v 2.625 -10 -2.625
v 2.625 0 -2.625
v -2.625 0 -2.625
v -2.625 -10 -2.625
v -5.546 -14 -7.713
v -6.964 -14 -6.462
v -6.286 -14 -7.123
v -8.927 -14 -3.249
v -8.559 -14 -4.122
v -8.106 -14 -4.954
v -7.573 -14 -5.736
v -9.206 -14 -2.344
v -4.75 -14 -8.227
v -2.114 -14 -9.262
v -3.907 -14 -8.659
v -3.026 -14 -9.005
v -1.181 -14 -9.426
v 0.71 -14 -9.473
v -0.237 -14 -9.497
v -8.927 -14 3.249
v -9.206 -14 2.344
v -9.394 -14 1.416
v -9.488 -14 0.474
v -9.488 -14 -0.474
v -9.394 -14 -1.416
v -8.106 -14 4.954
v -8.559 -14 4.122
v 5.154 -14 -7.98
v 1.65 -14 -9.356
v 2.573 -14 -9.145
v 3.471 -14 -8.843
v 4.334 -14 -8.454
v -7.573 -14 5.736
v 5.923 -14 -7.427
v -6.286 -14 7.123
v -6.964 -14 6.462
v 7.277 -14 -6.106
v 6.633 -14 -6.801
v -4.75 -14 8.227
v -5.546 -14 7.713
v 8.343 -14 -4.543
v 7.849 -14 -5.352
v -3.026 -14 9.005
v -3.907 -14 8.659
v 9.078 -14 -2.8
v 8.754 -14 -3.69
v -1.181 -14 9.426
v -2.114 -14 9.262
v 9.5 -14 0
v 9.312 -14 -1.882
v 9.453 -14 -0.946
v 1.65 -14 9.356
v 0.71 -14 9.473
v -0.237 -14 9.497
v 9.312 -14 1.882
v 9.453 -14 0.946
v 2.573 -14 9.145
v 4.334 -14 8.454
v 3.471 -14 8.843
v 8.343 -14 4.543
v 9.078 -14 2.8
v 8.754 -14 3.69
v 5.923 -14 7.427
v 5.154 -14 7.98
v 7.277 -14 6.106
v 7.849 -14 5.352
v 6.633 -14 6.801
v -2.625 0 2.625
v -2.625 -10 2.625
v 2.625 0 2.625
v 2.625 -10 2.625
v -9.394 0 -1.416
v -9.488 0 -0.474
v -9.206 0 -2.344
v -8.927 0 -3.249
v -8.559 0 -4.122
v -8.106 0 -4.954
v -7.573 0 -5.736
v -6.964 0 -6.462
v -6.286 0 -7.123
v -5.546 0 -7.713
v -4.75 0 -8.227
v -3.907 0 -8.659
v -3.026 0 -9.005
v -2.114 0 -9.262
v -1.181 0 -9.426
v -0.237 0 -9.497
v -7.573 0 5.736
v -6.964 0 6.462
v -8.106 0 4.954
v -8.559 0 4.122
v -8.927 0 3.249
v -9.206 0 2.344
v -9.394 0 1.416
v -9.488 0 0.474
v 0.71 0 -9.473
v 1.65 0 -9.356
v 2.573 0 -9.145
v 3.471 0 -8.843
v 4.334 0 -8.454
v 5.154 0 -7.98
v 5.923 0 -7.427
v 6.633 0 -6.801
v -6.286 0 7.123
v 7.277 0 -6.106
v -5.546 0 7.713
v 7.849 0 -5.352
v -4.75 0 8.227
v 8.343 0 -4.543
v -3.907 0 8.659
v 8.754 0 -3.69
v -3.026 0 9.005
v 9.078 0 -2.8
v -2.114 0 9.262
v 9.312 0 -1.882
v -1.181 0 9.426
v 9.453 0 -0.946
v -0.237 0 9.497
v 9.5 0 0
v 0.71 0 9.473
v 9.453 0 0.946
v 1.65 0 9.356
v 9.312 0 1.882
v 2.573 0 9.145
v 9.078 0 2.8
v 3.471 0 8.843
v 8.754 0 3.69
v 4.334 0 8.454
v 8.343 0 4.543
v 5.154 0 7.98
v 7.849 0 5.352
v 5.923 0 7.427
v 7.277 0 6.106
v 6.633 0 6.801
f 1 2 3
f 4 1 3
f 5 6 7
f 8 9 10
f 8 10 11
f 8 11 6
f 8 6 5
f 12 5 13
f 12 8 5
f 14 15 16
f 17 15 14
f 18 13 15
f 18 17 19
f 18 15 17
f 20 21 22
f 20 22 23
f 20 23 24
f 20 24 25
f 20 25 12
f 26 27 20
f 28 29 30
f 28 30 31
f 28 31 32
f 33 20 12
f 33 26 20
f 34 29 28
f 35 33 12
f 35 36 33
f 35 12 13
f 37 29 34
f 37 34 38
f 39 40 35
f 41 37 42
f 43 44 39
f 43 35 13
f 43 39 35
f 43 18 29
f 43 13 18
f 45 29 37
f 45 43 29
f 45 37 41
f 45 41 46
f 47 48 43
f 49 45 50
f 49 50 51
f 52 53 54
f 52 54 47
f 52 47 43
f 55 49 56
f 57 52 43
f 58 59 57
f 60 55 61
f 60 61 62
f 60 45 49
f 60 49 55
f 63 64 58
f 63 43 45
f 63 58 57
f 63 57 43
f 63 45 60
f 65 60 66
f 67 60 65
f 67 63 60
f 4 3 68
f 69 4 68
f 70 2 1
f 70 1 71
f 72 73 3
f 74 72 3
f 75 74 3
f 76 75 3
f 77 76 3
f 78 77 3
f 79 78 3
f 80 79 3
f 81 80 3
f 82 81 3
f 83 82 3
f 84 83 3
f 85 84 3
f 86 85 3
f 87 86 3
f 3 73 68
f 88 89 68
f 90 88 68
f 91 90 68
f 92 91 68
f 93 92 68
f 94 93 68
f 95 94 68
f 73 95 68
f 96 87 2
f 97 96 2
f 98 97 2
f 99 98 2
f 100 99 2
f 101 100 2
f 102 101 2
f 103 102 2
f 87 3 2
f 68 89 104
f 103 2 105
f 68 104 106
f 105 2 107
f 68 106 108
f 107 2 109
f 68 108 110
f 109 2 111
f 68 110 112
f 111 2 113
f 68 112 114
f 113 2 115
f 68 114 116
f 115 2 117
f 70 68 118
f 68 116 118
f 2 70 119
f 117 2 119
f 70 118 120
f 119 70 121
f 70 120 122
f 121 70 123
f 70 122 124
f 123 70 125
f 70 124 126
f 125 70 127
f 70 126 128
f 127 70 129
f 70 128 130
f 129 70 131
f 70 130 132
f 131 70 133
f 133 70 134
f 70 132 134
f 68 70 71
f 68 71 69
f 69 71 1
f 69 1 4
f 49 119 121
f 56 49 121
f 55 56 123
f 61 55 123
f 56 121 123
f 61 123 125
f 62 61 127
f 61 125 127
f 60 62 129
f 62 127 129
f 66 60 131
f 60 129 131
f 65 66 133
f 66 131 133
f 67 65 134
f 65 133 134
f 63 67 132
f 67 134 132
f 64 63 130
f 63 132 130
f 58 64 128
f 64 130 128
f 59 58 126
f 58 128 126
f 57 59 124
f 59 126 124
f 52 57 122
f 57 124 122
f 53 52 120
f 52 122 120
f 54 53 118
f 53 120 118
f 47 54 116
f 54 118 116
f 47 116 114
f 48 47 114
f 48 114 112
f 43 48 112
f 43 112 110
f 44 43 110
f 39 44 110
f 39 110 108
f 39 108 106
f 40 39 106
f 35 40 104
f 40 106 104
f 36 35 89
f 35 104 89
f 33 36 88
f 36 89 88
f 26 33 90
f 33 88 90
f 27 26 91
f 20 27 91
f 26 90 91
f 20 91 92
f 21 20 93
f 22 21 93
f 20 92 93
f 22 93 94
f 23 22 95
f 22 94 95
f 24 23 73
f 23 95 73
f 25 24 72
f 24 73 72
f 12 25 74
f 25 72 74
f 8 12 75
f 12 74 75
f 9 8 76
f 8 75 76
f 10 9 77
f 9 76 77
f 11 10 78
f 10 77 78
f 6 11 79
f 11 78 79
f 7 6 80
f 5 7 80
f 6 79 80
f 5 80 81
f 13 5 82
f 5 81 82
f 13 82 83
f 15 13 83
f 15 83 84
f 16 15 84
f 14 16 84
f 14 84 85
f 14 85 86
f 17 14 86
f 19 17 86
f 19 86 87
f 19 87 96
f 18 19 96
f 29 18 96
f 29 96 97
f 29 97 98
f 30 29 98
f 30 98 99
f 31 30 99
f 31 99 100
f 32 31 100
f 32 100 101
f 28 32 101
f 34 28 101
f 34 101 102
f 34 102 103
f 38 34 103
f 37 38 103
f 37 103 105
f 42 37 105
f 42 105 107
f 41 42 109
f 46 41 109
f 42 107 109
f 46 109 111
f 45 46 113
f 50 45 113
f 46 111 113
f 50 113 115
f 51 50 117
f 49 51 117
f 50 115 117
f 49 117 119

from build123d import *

# Parameters (mm, degrees)
F0_R     = 9.5
F1_DEPTH = 14
F2_W     = 5.25
F2_H     = 5.25
F3_DEPTH = 10


with BuildPart() as f1:
    # F0 (on Front) → F1 (new body)
    with BuildSketch(Plane.XZ):
        Circle(F0_R)
    extrude(amount=F1_DEPTH)

    # F2 (on face) → F3 (cut)
    with BuildSketch(Plane(origin=(0, 0, 0), x_dir=(-1, 0, 0), z_dir=(0, 1, 0))):
        Rectangle(F2_W, F2_H)
    extrude(amount=-F3_DEPTH, mode=Mode.SUBTRACT)


solid = f1.part
